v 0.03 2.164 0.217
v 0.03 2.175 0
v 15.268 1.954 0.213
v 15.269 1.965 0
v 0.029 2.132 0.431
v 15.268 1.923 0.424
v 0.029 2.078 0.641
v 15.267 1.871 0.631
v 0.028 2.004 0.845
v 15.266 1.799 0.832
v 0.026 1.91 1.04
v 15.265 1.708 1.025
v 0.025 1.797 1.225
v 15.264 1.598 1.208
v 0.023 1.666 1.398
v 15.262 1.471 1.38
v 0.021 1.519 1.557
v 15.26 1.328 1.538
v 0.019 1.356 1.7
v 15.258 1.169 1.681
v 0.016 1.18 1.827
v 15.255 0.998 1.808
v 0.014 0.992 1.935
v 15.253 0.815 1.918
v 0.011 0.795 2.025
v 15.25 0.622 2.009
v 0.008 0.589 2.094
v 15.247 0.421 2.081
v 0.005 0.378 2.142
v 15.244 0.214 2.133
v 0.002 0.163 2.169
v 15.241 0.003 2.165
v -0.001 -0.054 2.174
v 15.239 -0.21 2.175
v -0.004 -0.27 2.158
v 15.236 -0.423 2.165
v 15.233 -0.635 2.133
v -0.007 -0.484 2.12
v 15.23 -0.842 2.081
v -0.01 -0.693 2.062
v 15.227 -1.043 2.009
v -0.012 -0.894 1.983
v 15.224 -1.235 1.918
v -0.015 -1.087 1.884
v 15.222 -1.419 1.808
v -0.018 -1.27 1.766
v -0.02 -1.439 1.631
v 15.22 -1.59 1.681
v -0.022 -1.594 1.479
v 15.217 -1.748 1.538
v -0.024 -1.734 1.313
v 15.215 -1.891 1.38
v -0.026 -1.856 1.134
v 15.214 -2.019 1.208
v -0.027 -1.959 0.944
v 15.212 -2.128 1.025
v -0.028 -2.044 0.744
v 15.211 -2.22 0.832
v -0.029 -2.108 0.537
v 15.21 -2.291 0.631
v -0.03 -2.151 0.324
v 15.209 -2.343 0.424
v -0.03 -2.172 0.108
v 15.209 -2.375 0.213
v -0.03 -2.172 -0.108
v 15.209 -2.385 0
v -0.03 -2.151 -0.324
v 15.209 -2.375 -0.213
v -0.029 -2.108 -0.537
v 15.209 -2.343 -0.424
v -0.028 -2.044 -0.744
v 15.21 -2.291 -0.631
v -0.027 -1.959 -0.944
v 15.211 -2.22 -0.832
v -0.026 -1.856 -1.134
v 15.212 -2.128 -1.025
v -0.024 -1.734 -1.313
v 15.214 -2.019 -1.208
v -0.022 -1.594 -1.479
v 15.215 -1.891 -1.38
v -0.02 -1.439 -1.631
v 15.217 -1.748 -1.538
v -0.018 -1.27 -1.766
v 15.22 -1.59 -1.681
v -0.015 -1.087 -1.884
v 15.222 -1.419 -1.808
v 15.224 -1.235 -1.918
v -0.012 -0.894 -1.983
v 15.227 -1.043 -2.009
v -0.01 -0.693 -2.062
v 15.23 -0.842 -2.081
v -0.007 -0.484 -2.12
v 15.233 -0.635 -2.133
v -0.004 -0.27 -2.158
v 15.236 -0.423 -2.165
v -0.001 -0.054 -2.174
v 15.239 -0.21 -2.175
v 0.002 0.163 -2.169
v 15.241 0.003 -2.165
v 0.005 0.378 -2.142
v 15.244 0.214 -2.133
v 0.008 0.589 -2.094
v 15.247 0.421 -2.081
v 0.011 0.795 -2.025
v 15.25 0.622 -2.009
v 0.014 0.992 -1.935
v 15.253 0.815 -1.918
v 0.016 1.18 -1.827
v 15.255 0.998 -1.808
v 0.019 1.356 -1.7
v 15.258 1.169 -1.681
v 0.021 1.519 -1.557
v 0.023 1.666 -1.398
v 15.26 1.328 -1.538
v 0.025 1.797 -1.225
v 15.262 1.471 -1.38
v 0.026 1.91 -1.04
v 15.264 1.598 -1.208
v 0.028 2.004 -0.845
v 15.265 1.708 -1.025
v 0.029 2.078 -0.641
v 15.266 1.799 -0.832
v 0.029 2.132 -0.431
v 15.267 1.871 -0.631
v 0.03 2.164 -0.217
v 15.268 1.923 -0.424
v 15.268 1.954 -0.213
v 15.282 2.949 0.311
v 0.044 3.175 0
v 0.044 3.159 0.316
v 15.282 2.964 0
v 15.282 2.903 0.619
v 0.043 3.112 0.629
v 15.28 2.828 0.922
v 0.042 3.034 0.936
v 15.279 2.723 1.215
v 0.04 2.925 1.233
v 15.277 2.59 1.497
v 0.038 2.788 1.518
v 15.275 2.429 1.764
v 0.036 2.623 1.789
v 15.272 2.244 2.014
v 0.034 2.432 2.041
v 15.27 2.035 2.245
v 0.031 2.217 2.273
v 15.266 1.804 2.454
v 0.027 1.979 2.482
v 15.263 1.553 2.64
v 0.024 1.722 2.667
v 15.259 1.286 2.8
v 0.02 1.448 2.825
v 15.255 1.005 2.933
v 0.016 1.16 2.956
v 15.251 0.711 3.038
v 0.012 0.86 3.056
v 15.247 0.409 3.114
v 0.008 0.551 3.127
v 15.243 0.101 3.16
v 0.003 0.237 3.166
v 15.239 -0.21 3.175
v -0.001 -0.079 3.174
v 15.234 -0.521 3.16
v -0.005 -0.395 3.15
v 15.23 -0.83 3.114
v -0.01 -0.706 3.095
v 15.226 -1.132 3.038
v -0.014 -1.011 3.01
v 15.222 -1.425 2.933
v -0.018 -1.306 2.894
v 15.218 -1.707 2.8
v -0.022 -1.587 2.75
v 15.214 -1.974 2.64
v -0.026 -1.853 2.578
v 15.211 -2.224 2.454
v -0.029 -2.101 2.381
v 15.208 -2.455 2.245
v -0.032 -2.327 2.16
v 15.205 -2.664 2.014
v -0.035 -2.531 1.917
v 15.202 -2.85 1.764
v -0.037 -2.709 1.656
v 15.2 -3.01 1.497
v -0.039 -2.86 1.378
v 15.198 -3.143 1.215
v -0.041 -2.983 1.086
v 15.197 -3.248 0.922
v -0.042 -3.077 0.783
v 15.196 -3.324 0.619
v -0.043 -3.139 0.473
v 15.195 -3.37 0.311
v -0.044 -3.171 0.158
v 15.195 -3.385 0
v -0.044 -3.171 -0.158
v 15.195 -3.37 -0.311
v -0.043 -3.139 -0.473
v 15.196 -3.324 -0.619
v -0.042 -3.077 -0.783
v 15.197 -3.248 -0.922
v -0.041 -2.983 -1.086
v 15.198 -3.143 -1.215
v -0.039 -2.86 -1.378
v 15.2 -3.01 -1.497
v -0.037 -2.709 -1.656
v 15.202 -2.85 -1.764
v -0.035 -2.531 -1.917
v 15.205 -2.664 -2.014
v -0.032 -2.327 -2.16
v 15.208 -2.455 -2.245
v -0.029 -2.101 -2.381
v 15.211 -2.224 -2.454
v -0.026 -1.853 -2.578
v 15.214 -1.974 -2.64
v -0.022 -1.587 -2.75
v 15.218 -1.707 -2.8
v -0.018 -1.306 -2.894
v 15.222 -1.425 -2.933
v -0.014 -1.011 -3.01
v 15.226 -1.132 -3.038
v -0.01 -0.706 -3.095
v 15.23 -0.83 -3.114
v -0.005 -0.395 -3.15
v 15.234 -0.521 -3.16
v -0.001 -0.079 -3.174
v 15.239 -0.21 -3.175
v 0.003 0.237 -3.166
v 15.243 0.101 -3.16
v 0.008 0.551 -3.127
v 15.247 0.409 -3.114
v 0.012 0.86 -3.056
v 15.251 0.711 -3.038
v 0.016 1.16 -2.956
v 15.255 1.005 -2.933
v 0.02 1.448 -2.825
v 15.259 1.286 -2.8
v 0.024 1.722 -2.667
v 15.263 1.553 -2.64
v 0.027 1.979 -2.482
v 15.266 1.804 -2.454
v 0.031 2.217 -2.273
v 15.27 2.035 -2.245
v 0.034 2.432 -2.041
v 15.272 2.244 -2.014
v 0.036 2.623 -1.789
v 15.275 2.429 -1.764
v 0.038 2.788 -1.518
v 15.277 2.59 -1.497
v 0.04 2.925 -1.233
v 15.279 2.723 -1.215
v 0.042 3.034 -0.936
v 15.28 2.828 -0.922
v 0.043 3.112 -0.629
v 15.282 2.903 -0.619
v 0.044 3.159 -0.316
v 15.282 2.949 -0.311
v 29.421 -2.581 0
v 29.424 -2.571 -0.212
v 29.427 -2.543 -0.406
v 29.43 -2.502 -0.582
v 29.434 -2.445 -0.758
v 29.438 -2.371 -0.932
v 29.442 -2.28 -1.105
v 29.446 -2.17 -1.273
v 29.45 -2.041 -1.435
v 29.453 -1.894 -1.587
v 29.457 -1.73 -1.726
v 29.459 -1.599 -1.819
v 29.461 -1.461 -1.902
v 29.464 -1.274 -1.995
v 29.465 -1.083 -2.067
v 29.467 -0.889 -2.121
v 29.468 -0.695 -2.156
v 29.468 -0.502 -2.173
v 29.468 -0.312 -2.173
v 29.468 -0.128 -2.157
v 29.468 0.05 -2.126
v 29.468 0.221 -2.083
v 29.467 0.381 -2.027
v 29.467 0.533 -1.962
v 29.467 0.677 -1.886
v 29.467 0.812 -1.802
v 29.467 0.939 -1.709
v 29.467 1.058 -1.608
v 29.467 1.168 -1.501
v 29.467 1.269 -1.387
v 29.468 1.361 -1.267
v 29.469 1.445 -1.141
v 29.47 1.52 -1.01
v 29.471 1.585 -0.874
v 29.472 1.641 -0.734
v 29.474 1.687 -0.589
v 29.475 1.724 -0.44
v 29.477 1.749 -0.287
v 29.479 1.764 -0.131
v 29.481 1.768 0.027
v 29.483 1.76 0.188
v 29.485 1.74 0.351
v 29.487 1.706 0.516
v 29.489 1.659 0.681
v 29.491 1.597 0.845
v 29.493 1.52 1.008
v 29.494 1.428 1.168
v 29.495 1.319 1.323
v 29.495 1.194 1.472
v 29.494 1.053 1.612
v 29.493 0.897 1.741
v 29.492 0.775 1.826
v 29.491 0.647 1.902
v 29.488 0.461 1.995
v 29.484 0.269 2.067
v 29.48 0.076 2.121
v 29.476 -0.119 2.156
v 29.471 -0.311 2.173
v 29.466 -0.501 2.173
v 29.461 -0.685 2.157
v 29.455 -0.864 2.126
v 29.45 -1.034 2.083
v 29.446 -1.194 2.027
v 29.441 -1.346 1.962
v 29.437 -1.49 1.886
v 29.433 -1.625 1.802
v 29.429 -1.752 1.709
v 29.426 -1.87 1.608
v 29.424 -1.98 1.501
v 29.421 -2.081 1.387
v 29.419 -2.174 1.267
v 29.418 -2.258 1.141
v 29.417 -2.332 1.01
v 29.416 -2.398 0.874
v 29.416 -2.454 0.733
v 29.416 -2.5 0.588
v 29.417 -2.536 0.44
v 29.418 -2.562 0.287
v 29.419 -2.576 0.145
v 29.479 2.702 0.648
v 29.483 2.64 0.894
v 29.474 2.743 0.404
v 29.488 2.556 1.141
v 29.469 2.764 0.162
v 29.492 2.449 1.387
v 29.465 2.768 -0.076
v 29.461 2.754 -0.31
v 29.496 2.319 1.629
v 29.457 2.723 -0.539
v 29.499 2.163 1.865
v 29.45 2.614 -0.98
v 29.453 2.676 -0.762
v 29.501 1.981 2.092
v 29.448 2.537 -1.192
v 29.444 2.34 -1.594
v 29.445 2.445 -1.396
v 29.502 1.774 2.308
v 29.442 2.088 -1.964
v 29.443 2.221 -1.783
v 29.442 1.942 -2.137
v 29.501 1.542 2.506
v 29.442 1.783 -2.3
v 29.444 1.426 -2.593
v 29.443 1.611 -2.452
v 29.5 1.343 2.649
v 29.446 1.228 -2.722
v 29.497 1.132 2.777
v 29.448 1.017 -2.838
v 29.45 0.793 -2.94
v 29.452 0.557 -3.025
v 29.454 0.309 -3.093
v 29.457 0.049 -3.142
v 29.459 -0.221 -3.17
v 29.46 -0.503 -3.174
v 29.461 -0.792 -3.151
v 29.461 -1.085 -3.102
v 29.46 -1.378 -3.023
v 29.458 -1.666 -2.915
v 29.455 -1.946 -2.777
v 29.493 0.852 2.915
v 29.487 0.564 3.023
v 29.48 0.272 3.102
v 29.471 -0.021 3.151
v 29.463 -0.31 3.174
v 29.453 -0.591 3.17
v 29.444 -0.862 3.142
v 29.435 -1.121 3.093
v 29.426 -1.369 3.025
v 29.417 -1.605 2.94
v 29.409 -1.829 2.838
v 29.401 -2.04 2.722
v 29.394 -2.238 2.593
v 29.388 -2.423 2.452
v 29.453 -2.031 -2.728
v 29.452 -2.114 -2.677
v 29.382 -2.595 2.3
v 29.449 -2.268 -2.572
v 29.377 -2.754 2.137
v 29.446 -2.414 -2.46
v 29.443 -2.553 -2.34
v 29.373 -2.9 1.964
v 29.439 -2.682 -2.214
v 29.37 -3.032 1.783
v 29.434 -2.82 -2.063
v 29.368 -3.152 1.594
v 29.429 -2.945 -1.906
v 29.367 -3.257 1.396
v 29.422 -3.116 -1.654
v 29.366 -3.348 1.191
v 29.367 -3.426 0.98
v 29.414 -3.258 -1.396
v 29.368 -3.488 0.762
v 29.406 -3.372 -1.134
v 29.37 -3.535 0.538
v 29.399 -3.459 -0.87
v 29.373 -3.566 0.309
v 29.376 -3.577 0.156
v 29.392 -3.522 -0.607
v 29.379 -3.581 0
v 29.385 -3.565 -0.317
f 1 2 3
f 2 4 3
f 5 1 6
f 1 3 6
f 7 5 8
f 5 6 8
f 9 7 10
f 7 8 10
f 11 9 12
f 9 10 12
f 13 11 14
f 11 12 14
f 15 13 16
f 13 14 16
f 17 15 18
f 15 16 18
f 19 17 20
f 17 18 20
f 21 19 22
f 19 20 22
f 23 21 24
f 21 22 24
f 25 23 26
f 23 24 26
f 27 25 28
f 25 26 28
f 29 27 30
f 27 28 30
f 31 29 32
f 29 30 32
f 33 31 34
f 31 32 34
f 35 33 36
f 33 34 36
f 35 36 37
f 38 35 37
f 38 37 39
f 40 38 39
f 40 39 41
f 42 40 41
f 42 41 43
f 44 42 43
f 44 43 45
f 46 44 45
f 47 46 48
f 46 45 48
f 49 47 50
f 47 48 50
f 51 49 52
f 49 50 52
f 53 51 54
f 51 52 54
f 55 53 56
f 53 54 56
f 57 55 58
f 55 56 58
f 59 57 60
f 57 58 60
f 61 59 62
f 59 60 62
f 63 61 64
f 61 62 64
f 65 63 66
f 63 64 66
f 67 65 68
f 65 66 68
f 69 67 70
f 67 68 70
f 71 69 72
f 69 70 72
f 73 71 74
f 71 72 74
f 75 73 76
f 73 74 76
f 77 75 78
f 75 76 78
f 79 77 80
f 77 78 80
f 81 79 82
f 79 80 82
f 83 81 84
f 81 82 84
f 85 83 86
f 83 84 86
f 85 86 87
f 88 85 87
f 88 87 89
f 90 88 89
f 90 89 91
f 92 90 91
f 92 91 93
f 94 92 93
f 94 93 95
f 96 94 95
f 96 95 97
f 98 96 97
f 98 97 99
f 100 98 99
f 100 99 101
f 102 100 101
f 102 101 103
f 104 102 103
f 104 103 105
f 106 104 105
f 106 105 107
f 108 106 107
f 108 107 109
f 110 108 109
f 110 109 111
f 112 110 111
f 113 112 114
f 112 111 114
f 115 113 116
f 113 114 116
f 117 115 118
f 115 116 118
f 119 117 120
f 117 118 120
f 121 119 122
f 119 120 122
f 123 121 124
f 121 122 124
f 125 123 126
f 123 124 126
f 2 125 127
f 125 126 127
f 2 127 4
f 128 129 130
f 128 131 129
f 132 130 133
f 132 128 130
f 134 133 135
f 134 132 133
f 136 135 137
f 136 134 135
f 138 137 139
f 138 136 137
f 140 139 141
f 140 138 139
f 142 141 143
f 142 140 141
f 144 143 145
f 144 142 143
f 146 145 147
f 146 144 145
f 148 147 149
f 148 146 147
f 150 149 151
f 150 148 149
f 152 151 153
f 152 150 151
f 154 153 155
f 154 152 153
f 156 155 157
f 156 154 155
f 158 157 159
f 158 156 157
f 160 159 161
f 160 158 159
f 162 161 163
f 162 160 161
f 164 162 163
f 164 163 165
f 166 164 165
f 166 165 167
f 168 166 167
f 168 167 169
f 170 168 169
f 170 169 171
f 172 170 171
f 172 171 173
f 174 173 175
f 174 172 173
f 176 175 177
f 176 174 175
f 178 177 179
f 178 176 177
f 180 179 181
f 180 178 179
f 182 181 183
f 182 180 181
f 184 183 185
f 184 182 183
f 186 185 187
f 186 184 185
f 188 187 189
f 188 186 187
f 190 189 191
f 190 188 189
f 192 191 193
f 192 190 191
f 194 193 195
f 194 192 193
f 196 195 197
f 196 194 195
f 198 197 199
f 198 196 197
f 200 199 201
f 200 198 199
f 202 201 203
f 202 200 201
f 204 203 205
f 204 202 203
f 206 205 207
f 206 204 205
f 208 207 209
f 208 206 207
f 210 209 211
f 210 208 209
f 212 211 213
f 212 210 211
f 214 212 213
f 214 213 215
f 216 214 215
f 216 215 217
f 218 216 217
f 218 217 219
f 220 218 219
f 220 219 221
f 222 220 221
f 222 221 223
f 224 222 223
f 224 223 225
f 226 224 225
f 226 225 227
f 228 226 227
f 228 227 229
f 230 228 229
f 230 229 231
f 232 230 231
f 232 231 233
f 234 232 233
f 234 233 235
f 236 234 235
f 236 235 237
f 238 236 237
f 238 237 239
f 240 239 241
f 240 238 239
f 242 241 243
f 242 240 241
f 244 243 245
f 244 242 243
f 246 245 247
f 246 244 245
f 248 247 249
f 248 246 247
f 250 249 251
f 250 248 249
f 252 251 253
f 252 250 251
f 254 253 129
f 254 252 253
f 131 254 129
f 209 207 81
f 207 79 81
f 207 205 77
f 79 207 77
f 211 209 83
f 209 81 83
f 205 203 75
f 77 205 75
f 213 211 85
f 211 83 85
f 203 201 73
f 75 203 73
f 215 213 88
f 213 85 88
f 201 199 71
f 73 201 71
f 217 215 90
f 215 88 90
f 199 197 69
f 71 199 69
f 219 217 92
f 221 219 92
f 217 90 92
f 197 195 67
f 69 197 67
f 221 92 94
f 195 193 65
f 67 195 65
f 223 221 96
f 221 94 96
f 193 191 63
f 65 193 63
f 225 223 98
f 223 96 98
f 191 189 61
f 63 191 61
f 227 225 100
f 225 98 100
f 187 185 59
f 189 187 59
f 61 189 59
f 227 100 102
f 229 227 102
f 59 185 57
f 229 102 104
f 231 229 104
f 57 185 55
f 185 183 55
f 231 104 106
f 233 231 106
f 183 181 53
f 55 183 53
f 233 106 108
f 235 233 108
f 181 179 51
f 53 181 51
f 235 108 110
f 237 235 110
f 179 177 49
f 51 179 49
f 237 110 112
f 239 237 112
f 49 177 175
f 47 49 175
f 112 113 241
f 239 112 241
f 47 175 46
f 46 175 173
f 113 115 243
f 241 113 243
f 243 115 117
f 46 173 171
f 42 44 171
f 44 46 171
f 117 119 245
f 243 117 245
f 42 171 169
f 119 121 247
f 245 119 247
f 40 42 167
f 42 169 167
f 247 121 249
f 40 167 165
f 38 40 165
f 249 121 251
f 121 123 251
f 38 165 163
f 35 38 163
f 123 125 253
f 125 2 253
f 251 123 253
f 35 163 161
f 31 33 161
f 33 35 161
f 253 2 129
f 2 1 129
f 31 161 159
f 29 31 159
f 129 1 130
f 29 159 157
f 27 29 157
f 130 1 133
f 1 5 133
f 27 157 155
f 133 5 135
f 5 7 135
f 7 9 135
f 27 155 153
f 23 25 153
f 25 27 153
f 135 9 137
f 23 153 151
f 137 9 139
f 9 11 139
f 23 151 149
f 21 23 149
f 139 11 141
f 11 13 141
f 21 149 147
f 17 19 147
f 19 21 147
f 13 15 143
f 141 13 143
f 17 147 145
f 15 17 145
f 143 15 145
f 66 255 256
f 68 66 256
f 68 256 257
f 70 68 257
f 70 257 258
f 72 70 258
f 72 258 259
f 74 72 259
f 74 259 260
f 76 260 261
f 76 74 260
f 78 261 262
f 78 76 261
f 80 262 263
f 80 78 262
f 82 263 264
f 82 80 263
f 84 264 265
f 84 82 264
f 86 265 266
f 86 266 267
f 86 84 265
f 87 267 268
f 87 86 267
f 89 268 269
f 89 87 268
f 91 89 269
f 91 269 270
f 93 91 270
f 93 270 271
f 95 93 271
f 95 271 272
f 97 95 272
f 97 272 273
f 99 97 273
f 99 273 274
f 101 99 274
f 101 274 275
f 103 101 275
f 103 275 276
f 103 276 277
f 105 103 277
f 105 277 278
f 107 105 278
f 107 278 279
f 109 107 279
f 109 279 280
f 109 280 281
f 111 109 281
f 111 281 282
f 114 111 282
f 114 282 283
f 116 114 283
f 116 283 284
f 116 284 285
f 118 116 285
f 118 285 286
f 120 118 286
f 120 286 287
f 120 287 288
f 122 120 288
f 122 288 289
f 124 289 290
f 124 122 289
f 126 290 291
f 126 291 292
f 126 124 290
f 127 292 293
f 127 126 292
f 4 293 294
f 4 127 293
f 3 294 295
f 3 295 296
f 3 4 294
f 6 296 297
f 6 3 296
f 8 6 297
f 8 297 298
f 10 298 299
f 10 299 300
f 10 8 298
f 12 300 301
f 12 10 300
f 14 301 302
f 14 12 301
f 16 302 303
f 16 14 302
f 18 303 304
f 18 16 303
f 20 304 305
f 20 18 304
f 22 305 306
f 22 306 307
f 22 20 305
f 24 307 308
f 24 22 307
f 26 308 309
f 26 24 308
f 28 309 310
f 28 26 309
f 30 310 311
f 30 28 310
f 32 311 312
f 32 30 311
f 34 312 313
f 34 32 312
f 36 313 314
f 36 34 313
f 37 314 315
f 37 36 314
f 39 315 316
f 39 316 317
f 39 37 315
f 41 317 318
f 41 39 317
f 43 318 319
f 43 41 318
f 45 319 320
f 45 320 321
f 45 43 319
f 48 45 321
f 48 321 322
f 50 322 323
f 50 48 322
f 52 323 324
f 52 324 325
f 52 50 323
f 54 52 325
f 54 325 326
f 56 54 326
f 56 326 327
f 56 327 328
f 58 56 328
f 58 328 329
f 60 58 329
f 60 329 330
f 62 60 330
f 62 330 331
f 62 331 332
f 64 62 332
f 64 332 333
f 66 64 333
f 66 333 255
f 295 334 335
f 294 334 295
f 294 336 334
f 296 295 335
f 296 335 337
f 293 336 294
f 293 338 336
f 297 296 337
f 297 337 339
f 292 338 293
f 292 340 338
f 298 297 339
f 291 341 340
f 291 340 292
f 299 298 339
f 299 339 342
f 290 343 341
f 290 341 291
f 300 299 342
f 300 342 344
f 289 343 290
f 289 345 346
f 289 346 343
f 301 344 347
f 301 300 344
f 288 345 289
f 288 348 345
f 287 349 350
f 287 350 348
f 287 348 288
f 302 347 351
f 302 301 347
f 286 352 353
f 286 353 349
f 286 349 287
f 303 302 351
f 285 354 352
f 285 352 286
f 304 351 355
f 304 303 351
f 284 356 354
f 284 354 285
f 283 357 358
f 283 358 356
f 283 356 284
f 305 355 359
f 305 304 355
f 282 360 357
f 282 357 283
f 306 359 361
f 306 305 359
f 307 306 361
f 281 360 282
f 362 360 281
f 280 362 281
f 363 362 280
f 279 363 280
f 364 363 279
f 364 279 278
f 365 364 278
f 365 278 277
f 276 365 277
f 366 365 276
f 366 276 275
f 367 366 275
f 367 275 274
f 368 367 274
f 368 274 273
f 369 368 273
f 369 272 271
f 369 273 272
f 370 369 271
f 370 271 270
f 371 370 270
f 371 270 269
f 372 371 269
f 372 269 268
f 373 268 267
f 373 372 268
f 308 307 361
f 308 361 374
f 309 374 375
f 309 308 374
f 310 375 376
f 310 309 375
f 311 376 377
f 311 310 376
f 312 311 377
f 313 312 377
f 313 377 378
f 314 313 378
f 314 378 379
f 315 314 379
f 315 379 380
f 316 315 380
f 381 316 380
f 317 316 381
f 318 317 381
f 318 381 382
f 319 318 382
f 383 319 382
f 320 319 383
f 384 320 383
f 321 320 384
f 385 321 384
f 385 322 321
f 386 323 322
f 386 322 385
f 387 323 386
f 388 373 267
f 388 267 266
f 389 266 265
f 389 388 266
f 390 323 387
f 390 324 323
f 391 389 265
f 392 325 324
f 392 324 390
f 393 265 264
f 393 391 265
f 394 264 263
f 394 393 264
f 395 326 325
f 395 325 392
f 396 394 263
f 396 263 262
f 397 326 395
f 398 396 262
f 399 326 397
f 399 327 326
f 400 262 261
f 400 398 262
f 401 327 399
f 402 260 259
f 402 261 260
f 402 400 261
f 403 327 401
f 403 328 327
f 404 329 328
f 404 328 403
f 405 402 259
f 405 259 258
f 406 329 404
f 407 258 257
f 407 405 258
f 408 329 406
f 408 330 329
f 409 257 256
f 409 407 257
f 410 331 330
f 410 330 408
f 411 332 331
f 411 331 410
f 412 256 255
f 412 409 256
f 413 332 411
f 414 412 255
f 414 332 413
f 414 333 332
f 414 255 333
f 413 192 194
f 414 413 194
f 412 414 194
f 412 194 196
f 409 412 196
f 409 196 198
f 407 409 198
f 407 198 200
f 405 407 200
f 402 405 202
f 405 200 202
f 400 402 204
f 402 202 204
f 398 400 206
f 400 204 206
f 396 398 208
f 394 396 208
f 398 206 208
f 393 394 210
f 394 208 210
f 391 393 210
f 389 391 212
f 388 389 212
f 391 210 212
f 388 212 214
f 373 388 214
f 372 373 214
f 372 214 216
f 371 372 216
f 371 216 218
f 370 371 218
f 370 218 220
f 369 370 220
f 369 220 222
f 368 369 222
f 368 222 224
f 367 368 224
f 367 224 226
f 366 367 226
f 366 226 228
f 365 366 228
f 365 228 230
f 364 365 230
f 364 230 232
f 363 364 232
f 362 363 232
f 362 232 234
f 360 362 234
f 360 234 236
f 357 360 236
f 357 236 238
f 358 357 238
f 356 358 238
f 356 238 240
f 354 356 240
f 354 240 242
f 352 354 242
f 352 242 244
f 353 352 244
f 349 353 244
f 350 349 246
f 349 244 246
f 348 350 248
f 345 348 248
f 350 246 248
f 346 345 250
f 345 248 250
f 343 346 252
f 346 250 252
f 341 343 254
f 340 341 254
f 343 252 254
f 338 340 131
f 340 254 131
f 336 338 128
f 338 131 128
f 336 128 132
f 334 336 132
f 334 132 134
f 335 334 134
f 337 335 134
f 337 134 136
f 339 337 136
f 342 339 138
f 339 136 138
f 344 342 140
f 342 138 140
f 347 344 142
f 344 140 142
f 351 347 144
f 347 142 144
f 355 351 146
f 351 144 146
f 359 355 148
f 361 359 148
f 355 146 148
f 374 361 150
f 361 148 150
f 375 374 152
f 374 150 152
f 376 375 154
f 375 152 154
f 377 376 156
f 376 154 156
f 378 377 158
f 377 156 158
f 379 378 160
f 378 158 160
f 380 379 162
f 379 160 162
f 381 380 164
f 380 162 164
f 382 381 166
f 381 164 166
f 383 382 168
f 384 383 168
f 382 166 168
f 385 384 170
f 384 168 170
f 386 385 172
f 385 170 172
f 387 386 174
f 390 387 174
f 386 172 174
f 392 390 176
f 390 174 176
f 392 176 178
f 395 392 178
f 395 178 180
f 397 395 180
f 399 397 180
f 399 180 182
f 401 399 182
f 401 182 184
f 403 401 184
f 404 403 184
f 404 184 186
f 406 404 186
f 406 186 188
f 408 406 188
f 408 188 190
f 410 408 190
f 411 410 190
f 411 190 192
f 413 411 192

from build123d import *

# Parameters (mm, degrees)
SWEEP_SOTTILE1_PROFILE_R   = 3.175
SWEEP_SOTTILE1_PROFILE_R_2 = 2.175
BOSS_EXTRUDE1_OUTLINE_R    = 3.175
BOSS_EXTRUDE1_OUTLINE_R_2  = 2.175
BOSS_EXTRUDE1_DEPTH        = 14.238780227
BOSS_EXTRUDE1_START        = -4
BOSS_EXTRUDE1_2_DEPTH      = 8


with BuildPart() as part:
    # Sweep-Sottile1: sweep along a path in Schizzo1
    with BuildLine(Plane.XY) as sweep_sottile1_path:
        Line((0, 0), (15.23854919, -0.210282187))
    # Sweep-Sottile1 profile (on start of the path) → Sweep-Sottile1 (sweep)
    with BuildSketch(Plane(origin=(0, 0, 0), x_dir=(0.013798043774195348, 0.9999048024627172, 0), z_dir=(0.9999048024627172, -0.013798043774195348, 0))):
        Circle(SWEEP_SOTTILE1_PROFILE_R)
        Circle(SWEEP_SOTTILE1_PROFILE_R_2, mode=Mode.SUBTRACT)
    sweep(path=sweep_sottile1_path.line)

    # Boss-Extrude1: read off the stored shape, not the designer's step
    # Boss-Extrude1 outline → Boss-Extrude1 (add)
    with BuildSketch(Plane(origin=(15.23854919, -0.210282187, 0), x_dir=(-0.013798043774230273, -0.9999048024627166, 0), z_dir=(0.9999048024627166, -0.013798043774230273, 0))):
        Circle(BOSS_EXTRUDE1_OUTLINE_R)
        Circle(BOSS_EXTRUDE1_OUTLINE_R_2, mode=Mode.SUBTRACT)
    extrude(amount=BOSS_EXTRUDE1_DEPTH)

    # Boss-Extrude1 2 outline → Boss-Extrude1 2 (cut)
    with BuildSketch(Plane(origin=(0, 0, 0), x_dir=(0.9999776358196223, -0.0032413727320758433, -0.005849902854796434), z_dir=(0.006687889098871204, 0.48465221140979525, 0.8746813740528584)).offset(BOSS_EXTRUDE1_START)):
        with BuildLine():
            ThreePointArc((29.476633089, -0.355783952), (29.439947675, -1.943650915), (29.36824562, -3.530322313))
            Line((29.36824562, -3.530322313), (29.285578099, -5))
            Line((29.285578099, -5), (29.420577266, -5))
            Line((29.420577266, -5), (29.438313552, -3.530552917))
            Line((29.438313552, -3.530552917), (29.476633089, -0.355783952))
        make_face()
        with BuildLine():
            ThreePointArc((29.444899899, 2.8204373), (29.47828405, 1.23250169), (29.476633089, -0.355783952))
            Line((29.476633089, -0.355783952), (29.514952729, 2.818984581))
            Line((29.514952729, 2.818984581), (29.529207633, 4))
            Line((29.529207633, 4), (29.40708136, 4))
            Line((29.40708136, 4), (29.444899899, 2.8204373))
        make_face()
    extrude(amount=BOSS_EXTRUDE1_2_DEPTH, mode=Mode.SUBTRACT)


solid = part.part
